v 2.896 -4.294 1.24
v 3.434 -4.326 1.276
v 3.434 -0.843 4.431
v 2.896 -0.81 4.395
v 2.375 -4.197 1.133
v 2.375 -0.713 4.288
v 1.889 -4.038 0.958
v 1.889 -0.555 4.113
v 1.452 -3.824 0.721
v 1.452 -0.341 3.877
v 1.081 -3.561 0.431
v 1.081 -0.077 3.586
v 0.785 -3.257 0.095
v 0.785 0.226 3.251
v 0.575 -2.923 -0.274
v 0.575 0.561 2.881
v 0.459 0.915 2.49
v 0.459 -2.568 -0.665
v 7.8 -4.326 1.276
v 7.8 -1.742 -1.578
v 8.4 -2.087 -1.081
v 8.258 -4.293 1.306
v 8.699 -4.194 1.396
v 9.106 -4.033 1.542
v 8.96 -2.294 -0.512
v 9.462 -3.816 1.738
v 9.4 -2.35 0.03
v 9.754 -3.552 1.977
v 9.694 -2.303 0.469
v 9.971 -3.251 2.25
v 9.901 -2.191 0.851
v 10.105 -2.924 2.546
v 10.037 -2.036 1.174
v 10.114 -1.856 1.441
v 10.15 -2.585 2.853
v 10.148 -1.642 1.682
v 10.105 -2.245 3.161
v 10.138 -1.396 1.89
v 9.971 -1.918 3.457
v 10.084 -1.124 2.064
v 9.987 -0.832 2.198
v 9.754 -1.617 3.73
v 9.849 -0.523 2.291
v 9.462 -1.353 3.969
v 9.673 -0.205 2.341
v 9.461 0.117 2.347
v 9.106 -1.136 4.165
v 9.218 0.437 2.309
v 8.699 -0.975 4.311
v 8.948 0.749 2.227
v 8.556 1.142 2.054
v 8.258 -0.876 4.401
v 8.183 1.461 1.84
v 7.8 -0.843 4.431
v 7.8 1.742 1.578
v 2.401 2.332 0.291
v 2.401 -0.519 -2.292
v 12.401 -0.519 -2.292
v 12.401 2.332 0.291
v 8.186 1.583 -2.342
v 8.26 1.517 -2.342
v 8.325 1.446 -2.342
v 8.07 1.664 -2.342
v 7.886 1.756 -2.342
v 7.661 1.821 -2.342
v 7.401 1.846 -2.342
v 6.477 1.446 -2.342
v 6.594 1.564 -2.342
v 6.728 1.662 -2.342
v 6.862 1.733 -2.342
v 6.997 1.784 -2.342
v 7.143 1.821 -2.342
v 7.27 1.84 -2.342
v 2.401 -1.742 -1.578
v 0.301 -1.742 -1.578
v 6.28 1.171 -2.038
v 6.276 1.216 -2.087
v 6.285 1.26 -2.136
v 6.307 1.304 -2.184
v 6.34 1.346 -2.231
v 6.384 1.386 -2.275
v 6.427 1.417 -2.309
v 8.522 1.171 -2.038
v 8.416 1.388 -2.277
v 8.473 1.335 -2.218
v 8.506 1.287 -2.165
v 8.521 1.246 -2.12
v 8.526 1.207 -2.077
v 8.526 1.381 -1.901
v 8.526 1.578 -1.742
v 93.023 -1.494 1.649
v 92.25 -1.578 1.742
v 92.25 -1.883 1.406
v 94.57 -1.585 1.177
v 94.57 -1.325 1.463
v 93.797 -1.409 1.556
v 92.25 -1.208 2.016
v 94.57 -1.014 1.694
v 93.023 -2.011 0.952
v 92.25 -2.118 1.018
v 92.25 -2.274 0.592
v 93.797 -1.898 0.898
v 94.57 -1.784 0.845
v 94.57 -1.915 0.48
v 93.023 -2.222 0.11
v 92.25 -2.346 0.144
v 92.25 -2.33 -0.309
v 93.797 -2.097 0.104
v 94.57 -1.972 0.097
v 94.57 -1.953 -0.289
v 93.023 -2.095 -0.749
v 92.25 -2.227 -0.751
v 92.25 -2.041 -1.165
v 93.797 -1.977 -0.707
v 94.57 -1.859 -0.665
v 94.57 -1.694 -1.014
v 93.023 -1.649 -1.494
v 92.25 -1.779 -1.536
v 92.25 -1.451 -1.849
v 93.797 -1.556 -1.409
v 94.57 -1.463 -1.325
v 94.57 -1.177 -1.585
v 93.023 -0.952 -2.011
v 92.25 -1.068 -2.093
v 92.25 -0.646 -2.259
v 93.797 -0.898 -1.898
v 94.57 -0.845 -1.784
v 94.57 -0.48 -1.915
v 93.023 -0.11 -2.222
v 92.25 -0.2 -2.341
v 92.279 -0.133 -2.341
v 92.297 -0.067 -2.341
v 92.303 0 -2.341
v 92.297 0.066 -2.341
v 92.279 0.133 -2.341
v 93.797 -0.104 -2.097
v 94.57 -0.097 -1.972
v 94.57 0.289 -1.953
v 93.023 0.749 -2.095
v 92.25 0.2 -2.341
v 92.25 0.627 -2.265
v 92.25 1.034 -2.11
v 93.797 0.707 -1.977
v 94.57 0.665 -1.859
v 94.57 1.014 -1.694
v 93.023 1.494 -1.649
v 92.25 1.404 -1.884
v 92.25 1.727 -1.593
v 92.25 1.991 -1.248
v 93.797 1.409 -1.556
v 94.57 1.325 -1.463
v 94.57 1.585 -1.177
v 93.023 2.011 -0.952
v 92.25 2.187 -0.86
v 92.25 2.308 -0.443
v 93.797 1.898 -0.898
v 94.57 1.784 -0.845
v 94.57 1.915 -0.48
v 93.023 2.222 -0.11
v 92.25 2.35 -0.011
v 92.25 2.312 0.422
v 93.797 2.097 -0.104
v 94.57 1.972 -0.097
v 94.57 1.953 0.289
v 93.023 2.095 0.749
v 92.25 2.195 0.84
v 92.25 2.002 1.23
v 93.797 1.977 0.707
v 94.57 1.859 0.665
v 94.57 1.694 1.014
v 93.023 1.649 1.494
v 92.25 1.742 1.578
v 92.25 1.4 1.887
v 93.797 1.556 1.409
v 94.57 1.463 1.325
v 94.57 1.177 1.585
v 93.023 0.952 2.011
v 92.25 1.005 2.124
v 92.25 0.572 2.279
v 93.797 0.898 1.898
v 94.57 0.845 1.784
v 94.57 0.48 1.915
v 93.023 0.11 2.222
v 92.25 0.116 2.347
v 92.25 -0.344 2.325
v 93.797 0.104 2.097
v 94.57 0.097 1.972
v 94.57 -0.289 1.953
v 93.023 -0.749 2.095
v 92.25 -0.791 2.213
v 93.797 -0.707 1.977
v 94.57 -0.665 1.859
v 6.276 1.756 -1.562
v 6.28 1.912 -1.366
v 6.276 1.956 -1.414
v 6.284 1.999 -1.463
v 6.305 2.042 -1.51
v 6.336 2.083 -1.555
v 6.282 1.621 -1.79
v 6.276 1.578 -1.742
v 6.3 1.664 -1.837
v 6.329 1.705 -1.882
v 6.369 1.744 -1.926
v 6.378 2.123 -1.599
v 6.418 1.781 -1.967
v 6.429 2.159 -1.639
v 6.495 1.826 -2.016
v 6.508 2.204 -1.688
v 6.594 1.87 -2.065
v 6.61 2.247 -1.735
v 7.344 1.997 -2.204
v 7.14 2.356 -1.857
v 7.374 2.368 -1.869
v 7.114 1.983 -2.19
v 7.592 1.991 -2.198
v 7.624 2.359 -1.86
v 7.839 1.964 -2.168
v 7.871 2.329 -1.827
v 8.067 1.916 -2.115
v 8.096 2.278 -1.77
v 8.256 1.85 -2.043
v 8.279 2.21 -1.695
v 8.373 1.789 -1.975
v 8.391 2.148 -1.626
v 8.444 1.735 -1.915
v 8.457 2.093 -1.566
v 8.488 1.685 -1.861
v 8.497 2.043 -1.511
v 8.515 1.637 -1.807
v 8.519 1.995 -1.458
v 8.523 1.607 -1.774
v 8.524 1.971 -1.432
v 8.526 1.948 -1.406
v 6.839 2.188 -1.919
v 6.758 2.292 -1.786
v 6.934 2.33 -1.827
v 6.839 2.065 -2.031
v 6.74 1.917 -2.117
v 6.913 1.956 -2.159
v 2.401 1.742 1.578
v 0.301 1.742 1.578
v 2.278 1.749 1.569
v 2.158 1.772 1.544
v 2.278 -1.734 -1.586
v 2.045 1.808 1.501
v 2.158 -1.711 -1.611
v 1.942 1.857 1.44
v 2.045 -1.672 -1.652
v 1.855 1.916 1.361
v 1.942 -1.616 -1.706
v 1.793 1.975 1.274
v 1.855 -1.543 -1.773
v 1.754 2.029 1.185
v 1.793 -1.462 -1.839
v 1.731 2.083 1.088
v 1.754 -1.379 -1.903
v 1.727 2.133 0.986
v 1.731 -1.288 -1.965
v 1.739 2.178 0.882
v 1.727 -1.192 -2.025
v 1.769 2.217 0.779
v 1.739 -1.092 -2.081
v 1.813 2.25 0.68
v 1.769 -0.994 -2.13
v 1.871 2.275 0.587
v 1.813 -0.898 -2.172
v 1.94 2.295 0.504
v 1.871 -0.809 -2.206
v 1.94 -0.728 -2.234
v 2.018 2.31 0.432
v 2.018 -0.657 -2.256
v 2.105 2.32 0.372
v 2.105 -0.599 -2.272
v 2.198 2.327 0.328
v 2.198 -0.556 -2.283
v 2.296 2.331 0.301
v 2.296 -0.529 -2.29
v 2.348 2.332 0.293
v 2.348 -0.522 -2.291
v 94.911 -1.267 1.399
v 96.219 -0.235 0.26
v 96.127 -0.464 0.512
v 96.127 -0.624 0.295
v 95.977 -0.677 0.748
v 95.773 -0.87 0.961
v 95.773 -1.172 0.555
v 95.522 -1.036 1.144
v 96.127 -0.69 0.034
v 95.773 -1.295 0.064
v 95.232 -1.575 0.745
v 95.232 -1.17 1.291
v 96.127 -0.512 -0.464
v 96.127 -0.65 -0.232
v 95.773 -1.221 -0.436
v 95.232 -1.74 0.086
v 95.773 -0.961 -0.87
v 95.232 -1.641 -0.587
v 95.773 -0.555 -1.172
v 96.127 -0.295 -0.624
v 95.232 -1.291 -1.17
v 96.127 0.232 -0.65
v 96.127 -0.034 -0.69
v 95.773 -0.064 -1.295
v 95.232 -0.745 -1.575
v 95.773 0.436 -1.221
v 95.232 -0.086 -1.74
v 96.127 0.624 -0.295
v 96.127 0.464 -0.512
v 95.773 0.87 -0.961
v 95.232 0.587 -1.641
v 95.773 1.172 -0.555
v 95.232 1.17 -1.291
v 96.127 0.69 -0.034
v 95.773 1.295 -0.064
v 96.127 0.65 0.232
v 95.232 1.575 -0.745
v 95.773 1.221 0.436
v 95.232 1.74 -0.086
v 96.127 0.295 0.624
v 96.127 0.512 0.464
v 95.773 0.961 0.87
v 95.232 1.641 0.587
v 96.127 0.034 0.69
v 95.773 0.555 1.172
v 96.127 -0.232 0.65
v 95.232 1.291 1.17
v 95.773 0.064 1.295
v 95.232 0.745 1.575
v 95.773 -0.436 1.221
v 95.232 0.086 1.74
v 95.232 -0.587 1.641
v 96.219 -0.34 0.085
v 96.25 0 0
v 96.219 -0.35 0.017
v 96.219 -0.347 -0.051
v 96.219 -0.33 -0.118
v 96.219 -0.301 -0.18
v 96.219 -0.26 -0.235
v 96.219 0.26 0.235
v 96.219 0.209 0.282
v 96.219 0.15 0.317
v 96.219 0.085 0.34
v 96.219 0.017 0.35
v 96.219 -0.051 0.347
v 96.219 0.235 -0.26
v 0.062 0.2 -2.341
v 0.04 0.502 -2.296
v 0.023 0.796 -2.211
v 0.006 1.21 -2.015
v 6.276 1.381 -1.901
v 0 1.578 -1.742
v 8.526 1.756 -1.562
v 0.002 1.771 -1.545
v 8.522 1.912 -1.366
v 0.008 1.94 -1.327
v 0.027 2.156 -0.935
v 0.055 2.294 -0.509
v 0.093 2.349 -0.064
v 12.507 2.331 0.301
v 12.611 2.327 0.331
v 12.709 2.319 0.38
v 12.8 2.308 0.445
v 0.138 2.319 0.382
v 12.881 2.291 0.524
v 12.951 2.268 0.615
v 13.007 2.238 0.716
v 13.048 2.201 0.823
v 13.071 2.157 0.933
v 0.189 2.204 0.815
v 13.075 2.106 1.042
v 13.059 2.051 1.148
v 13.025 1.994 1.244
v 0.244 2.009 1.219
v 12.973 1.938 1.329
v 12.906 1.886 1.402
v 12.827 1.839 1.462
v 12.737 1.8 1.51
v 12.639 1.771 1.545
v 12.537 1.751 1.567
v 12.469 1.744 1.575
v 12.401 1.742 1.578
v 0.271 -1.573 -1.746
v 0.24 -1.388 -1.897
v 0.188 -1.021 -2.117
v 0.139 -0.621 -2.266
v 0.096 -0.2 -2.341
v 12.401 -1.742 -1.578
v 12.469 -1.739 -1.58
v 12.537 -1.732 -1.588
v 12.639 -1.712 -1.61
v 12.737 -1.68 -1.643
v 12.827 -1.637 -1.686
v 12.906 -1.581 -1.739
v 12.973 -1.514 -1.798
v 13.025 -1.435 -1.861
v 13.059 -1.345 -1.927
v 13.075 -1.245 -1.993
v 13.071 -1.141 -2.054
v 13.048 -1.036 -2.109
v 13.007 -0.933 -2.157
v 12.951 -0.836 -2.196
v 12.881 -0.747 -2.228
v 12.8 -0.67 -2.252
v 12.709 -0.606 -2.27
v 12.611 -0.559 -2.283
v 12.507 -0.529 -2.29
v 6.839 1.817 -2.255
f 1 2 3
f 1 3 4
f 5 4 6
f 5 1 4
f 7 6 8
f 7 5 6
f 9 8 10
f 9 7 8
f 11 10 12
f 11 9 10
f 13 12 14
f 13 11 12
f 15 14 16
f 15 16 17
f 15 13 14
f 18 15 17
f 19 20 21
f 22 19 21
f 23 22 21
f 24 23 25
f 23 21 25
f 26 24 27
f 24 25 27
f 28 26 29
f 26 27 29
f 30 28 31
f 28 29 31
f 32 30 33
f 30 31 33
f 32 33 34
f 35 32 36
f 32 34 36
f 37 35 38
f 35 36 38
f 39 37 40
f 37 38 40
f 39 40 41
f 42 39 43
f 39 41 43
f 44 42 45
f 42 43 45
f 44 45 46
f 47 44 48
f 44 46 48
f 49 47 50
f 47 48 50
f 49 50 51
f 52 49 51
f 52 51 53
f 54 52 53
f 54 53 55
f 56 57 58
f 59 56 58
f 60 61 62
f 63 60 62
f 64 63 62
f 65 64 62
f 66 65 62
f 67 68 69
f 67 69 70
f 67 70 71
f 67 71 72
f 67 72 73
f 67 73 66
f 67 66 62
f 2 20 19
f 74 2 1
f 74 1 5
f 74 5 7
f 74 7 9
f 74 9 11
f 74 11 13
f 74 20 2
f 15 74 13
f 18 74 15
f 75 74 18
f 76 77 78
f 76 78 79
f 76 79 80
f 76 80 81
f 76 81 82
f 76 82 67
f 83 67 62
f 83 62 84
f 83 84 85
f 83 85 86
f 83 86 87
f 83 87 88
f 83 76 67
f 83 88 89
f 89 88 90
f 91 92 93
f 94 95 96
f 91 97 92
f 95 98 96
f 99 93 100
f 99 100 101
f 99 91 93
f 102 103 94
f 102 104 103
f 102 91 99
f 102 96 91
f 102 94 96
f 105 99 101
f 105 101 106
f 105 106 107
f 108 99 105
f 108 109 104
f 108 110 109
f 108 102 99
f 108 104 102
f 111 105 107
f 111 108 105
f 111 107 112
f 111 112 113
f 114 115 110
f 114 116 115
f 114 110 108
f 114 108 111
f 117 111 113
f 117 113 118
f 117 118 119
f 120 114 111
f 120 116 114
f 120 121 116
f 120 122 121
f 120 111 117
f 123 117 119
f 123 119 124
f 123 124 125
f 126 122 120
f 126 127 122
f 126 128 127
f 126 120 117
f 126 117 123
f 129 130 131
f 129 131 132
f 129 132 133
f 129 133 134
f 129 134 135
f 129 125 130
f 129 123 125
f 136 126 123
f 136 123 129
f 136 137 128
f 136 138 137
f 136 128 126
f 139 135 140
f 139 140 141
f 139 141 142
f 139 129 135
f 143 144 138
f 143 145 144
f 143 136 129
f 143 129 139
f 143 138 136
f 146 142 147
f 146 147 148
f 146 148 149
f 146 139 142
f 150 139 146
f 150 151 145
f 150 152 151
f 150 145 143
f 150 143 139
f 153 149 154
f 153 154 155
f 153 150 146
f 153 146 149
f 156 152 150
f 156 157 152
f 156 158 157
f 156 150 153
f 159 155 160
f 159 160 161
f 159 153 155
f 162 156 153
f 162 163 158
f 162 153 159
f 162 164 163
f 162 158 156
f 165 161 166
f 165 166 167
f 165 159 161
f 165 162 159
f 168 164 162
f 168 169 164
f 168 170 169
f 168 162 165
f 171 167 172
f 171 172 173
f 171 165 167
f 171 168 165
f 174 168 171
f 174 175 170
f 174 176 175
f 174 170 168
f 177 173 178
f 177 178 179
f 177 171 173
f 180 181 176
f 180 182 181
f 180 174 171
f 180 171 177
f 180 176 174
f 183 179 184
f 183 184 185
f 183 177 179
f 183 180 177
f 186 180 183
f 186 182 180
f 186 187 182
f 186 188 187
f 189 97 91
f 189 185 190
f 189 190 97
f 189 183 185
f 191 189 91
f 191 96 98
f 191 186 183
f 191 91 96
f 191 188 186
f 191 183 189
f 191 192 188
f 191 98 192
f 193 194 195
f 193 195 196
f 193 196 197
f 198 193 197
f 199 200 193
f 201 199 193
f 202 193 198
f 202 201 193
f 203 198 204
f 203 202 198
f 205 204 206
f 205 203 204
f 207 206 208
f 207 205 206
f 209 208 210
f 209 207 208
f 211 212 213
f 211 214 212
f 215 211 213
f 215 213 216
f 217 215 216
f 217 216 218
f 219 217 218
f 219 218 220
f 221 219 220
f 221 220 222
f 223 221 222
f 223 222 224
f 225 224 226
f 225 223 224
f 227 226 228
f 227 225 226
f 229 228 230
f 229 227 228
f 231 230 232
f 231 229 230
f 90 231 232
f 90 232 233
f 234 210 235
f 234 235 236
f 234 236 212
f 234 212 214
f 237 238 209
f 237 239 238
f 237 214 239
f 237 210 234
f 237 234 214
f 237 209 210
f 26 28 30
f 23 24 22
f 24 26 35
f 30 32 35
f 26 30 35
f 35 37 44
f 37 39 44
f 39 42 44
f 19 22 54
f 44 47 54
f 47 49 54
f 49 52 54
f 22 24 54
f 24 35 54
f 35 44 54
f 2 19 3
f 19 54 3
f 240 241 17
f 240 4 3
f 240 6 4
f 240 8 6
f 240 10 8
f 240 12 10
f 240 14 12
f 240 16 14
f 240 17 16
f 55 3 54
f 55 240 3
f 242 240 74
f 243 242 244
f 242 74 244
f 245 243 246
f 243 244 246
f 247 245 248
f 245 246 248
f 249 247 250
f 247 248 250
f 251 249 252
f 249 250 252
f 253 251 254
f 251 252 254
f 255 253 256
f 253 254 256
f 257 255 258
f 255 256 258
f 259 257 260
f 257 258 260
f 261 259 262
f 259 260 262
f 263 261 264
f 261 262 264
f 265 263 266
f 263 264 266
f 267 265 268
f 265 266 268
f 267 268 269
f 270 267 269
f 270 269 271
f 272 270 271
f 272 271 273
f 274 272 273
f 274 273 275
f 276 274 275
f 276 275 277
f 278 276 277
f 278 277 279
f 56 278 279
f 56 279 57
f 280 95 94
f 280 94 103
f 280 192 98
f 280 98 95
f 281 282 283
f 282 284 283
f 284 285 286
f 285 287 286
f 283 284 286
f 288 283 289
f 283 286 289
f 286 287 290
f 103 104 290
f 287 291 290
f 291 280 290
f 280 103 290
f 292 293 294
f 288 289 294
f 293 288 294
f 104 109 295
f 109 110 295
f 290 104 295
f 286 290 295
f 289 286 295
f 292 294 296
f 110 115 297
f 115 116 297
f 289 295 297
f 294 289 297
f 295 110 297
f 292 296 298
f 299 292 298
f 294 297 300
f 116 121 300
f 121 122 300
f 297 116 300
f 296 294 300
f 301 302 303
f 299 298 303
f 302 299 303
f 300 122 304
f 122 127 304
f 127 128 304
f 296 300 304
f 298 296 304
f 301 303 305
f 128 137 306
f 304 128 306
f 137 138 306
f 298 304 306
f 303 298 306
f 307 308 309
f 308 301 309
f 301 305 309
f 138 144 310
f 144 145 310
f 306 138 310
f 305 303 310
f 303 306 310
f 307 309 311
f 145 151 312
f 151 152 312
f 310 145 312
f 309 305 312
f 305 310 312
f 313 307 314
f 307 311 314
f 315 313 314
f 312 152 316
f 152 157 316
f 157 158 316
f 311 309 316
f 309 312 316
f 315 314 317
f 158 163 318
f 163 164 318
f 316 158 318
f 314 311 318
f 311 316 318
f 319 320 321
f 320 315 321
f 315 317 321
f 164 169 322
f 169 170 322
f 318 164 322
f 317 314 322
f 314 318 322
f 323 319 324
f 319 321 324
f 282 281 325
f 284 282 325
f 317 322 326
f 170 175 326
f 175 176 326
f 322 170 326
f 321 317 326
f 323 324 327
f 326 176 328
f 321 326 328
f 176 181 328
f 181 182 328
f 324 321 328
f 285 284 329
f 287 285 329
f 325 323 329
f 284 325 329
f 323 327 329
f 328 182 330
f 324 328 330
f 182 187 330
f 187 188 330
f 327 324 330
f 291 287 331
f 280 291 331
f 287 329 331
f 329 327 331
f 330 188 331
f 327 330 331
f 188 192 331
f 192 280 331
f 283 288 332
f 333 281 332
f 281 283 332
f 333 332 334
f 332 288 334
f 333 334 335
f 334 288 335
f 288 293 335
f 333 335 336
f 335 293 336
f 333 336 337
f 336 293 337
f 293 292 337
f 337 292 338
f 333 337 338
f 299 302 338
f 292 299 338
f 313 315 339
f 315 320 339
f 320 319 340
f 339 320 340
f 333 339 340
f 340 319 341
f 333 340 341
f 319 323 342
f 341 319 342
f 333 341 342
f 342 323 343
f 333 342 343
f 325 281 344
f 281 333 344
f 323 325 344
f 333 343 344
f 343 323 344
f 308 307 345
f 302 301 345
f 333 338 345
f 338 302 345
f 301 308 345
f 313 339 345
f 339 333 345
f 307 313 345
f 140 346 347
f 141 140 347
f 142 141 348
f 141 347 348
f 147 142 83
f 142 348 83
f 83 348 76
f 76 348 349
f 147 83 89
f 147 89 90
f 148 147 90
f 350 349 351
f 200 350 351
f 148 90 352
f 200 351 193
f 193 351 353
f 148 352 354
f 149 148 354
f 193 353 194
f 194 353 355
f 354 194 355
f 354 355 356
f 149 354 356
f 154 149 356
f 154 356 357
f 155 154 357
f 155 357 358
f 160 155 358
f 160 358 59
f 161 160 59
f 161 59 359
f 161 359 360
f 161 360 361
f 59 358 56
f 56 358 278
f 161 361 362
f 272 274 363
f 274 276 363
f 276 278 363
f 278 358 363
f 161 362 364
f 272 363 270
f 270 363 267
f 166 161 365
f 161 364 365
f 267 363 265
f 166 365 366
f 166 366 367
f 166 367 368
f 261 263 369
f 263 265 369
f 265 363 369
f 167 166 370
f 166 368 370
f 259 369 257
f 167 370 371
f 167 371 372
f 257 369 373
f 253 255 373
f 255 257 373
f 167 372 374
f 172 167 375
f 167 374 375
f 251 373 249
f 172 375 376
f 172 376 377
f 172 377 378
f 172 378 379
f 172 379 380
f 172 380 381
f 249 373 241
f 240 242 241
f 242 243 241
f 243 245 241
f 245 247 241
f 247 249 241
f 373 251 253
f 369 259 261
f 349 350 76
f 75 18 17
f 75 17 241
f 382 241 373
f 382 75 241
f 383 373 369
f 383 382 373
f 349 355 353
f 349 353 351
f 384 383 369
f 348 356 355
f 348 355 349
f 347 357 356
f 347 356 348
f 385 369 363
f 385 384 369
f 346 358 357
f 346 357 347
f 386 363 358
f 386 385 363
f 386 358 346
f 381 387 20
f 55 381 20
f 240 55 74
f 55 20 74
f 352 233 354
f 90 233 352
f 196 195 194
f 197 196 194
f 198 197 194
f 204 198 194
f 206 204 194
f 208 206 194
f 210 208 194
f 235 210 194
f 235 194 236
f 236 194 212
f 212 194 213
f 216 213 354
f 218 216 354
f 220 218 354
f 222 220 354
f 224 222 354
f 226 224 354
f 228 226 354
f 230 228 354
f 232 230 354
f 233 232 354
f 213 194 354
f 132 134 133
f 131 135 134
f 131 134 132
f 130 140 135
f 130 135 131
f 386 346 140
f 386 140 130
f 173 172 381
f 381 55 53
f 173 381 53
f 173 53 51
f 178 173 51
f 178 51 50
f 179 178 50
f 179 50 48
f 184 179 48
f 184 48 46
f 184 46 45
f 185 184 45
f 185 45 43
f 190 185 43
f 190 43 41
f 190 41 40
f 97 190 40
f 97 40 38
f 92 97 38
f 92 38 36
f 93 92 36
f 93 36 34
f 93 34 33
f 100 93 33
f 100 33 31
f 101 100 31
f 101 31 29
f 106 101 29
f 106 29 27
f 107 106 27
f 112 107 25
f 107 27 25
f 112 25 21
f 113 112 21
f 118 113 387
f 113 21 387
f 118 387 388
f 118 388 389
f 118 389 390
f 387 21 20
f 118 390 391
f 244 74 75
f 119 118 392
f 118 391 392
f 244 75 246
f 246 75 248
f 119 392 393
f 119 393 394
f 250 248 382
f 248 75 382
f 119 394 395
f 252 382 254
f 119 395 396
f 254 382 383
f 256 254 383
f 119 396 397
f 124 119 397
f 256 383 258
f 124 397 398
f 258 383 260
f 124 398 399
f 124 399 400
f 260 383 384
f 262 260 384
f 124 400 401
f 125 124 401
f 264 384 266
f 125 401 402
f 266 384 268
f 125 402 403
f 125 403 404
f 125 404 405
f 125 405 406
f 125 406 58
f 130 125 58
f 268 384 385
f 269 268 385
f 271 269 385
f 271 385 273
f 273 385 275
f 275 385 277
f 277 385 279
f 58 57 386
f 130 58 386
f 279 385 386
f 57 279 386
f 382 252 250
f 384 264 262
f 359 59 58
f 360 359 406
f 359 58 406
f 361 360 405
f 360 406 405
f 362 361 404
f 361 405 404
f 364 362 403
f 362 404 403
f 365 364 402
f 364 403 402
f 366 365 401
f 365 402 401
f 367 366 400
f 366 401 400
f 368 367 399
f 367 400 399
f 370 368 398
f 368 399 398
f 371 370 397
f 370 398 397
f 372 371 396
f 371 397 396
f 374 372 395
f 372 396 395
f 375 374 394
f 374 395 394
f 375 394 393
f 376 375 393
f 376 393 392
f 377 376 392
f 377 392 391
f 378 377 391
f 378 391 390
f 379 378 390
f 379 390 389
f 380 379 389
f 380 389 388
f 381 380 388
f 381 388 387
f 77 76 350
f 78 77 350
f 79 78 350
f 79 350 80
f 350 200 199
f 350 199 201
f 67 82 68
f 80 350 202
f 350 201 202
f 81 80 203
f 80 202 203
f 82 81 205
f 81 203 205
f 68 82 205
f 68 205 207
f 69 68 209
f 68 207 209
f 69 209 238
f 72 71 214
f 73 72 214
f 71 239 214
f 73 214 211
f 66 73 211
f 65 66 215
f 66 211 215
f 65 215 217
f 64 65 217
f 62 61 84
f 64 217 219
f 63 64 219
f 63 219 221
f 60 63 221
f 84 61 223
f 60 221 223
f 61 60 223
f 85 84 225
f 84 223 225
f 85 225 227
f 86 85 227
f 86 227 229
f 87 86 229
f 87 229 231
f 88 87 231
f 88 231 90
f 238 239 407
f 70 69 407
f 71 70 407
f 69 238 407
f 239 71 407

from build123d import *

# Parameters (mm, degrees)
SKETCH_R             = 2.35
PAD_DEPTH            = 96.25
PAD001_DEPTH         = 3.85
POCKET_DEPTH         = 5
PAD002_DEPTH         = 0.5
PAD002_DEPTH_BACK    = 0.5
POCKET001_DEPTH      = 10
POCKET002_DEPTH      = 100
POCKET002_DEPTH_BACK = -100
BODY_PLACEMENT_ANGLE = 42.17


with BuildPart() as part:
    # Sketch → Pad (new body)
    with BuildSketch(Plane.YZ):
        Circle(SKETCH_R)
    extrude(amount=PAD_DEPTH)

    # Sketch001 → Pad001 (join)
    with BuildSketch(Plane.XY):
        with BuildLine():
            Line((0, -2.35), (0, 2.35))
            Line((0, 2.35), (7.8, 2.35))
            ThreePointArc((7.8, -2.35), (10.15, 0), (7.8, 2.35))
            Line((7.8, -2.35), (0, -2.35))
        make_face()
    extrude(amount=PAD001_DEPTH)

    # Sketch002 (on Face7 of Pad001) → Pocket (cut)
    with BuildSketch(Plane(origin=(0, -2.35, 0), x_dir=(0, 0, -1), z_dir=(0, -1, 0))):
        with BuildLine():
            Line((-1.231194, 0.458762), (2.35, 0))
            Line((-3.85, 0), (2.35, 0))
            Line((-3.85, 3.434445), (-3.85, 0))
            ThreePointArc((-3.85, 3.434445), (-3.102064, 1.452474), (-1.231194, 0.458762))
        make_face()
    extrude(amount=-POCKET_DEPTH, mode=Mode.SUBTRACT)

    # Sketch003 → Pad002 (join, two sides)
    with BuildSketch(Plane.XZ) as pad002_sk:
        with BuildLine():
            add(Edge.make_bspline(
                [(8.526042, -2.35), (8.526042, -1.267468), (6.838542, -1.808734), (5.151042, -2.35), (6.838542, -2.891266), (8.526042, -3.432532), (8.526042, -2.35)],
                knots=[0, 0, 0, 2.094395, 2.094395, 4.18879, 4.18879, 6.283185, 6.283185, 6.283185], degree=2, weights=[1, 0.5, 1, 0.5, 1, 0.5, 1]))
        make_face()
    extrude(amount=PAD002_DEPTH)
    extrude(pad002_sk.sketch, amount=-PAD002_DEPTH_BACK)

    # Sketch004 (on Face2 of Pad002) → Pocket001 (cut)
    with BuildSketch(Plane(origin=(0, -2.35, 0), x_dir=(0, 0, -1), z_dir=(0, -1, 0))):
        with BuildLine():
            ThreePointArc((0, 2.401042), (0.675, 1.726042), (1.35, 2.401042))
            Line((1.35, 2.401042), (1.35, 12.401042))
            ThreePointArc((1.35, 12.401042), (0.675, 13.076042), (0, 12.401042))
            Line((0, 12.401042), (0, 2.401042))
        make_face()
    extrude(amount=-POCKET001_DEPTH, mode=Mode.SUBTRACT)

    # Sketch005 → Groove (revolve, cut)
    with BuildSketch(Plane.XZ):
        with BuildLine():
            Line((96.25, 2.35), (92.25, 2.35))
            Line((92.25, 2.35), (94.569769, 1.974271))
            ThreePointArc((96.25, 0), (95.773079, 1.296237), (94.569769, 1.974271))
            Line((97.25, 0), (96.25, 0))
            Line((97.25, 2.35), (97.25, 0))
            Line((96.25, 2.35), (97.25, 2.35))
        make_face()
    revolve(axis=Axis((0, 0, 0), (1, 0, 0)), mode=Mode.SUBTRACT)

    # Sketch006 → Pocket002 (cut, two sides)
    with BuildSketch(Plane.YZ) as pocket002_sk:
        Polygon((-1.720242, -1.601021), (-1.720242, -2.975), (-0.203555, -2.975), align=None)
    extrude(amount=-POCKET002_DEPTH, mode=Mode.SUBTRACT)
    extrude(pocket002_sk.sketch, amount=-POCKET002_DEPTH_BACK, mode=Mode.SUBTRACT)


with BuildPart() as part_1:
    # Body placement: moved
    add(part.part.rotate(Axis((0, 0, 0), (1, 0, 0)), BODY_PLACEMENT_ANGLE))


solid = part_1.part
